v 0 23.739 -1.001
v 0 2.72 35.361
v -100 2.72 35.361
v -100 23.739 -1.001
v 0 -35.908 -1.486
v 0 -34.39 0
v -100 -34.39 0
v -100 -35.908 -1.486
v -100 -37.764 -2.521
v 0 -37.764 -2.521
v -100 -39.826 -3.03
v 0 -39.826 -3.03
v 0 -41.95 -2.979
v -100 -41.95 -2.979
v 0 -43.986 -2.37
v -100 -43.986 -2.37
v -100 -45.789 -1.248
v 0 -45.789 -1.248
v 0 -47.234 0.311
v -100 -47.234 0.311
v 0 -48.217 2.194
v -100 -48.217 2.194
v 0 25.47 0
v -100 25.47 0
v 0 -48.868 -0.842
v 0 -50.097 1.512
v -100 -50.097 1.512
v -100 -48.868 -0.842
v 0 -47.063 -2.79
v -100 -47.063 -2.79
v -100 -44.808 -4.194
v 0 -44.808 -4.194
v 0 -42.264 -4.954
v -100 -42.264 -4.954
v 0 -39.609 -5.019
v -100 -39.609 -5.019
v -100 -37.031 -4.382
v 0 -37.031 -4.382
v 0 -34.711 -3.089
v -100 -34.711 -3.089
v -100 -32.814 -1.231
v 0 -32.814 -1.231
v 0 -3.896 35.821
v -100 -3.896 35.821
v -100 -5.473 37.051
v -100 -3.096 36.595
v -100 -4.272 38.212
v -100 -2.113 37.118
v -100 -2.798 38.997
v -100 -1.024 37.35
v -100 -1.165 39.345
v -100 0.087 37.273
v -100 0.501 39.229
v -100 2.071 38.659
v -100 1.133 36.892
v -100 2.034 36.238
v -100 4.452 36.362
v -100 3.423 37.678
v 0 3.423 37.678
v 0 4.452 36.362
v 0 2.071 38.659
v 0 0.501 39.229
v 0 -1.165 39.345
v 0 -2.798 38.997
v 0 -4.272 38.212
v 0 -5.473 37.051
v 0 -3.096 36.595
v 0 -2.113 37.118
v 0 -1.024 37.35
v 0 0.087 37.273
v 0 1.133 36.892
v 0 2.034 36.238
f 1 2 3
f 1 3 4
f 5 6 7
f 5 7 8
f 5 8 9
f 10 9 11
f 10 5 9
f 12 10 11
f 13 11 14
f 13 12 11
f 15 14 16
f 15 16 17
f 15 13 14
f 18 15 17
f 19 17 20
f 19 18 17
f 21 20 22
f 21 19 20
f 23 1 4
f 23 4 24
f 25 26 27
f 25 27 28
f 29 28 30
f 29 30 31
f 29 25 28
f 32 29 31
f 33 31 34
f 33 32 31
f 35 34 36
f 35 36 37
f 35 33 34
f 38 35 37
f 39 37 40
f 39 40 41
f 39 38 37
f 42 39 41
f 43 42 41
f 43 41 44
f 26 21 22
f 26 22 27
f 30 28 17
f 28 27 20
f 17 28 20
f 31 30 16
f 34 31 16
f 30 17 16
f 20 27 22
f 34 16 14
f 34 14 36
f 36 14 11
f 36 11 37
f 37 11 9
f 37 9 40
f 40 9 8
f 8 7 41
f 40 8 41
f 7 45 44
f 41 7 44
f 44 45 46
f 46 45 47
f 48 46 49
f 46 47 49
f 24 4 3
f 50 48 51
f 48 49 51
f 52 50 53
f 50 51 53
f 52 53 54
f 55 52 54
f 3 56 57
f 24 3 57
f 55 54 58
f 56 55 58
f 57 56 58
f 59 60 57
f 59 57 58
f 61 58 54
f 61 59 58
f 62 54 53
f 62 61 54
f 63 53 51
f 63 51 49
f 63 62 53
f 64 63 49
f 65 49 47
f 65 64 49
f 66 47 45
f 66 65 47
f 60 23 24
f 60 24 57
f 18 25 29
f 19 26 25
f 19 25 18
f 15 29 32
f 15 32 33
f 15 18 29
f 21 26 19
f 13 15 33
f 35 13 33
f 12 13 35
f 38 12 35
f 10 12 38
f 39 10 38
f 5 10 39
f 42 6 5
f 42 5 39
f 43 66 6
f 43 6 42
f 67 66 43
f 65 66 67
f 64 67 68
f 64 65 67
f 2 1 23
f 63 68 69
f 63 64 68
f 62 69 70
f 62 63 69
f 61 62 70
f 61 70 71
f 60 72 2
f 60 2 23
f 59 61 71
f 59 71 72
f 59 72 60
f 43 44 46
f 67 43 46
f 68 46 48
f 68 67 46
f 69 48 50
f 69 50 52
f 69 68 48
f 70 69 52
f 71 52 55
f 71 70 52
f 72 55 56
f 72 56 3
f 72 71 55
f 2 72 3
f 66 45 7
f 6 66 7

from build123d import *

# Parameters (mm, degrees)
F1_DEPTH = 100


with BuildPart() as f1:
    # F0 (on Right) → F1 (new body)
    with BuildSketch(Plane.YZ):
        with BuildLine():
            Line((-5.472958, 37.051259), (-34.390154, 0))
            ThreePointArc((-34.390154, 0), (-41.9504, -2.979086), (-48.217188, 2.193884))
            Line((-48.217188, 2.193884), (-50.097297, 1.511836))
            ThreePointArc((-50.097297, 1.511836), (-42.263812, -4.954377), (-32.813505, -1.230519))
            Line((-32.813505, -1.230519), (-3.896309, 35.82074))
            ThreePointArc((-3.896309, 35.82074), (-0.46602, 37.3501), (2.720071, 35.361468))
            Line((2.720071, 35.361468), (23.738619, -1.000883))
            Line((23.738619, -1.000883), (25.47016, 0))
            Line((25.47016, 0), (4.451611, 36.362352))
            ThreePointArc((4.451611, 36.362352), (-0.327524, 39.345299), (-5.472958, 37.051259))
        make_face()
    extrude(amount=-F1_DEPTH)


solid = f1.part
